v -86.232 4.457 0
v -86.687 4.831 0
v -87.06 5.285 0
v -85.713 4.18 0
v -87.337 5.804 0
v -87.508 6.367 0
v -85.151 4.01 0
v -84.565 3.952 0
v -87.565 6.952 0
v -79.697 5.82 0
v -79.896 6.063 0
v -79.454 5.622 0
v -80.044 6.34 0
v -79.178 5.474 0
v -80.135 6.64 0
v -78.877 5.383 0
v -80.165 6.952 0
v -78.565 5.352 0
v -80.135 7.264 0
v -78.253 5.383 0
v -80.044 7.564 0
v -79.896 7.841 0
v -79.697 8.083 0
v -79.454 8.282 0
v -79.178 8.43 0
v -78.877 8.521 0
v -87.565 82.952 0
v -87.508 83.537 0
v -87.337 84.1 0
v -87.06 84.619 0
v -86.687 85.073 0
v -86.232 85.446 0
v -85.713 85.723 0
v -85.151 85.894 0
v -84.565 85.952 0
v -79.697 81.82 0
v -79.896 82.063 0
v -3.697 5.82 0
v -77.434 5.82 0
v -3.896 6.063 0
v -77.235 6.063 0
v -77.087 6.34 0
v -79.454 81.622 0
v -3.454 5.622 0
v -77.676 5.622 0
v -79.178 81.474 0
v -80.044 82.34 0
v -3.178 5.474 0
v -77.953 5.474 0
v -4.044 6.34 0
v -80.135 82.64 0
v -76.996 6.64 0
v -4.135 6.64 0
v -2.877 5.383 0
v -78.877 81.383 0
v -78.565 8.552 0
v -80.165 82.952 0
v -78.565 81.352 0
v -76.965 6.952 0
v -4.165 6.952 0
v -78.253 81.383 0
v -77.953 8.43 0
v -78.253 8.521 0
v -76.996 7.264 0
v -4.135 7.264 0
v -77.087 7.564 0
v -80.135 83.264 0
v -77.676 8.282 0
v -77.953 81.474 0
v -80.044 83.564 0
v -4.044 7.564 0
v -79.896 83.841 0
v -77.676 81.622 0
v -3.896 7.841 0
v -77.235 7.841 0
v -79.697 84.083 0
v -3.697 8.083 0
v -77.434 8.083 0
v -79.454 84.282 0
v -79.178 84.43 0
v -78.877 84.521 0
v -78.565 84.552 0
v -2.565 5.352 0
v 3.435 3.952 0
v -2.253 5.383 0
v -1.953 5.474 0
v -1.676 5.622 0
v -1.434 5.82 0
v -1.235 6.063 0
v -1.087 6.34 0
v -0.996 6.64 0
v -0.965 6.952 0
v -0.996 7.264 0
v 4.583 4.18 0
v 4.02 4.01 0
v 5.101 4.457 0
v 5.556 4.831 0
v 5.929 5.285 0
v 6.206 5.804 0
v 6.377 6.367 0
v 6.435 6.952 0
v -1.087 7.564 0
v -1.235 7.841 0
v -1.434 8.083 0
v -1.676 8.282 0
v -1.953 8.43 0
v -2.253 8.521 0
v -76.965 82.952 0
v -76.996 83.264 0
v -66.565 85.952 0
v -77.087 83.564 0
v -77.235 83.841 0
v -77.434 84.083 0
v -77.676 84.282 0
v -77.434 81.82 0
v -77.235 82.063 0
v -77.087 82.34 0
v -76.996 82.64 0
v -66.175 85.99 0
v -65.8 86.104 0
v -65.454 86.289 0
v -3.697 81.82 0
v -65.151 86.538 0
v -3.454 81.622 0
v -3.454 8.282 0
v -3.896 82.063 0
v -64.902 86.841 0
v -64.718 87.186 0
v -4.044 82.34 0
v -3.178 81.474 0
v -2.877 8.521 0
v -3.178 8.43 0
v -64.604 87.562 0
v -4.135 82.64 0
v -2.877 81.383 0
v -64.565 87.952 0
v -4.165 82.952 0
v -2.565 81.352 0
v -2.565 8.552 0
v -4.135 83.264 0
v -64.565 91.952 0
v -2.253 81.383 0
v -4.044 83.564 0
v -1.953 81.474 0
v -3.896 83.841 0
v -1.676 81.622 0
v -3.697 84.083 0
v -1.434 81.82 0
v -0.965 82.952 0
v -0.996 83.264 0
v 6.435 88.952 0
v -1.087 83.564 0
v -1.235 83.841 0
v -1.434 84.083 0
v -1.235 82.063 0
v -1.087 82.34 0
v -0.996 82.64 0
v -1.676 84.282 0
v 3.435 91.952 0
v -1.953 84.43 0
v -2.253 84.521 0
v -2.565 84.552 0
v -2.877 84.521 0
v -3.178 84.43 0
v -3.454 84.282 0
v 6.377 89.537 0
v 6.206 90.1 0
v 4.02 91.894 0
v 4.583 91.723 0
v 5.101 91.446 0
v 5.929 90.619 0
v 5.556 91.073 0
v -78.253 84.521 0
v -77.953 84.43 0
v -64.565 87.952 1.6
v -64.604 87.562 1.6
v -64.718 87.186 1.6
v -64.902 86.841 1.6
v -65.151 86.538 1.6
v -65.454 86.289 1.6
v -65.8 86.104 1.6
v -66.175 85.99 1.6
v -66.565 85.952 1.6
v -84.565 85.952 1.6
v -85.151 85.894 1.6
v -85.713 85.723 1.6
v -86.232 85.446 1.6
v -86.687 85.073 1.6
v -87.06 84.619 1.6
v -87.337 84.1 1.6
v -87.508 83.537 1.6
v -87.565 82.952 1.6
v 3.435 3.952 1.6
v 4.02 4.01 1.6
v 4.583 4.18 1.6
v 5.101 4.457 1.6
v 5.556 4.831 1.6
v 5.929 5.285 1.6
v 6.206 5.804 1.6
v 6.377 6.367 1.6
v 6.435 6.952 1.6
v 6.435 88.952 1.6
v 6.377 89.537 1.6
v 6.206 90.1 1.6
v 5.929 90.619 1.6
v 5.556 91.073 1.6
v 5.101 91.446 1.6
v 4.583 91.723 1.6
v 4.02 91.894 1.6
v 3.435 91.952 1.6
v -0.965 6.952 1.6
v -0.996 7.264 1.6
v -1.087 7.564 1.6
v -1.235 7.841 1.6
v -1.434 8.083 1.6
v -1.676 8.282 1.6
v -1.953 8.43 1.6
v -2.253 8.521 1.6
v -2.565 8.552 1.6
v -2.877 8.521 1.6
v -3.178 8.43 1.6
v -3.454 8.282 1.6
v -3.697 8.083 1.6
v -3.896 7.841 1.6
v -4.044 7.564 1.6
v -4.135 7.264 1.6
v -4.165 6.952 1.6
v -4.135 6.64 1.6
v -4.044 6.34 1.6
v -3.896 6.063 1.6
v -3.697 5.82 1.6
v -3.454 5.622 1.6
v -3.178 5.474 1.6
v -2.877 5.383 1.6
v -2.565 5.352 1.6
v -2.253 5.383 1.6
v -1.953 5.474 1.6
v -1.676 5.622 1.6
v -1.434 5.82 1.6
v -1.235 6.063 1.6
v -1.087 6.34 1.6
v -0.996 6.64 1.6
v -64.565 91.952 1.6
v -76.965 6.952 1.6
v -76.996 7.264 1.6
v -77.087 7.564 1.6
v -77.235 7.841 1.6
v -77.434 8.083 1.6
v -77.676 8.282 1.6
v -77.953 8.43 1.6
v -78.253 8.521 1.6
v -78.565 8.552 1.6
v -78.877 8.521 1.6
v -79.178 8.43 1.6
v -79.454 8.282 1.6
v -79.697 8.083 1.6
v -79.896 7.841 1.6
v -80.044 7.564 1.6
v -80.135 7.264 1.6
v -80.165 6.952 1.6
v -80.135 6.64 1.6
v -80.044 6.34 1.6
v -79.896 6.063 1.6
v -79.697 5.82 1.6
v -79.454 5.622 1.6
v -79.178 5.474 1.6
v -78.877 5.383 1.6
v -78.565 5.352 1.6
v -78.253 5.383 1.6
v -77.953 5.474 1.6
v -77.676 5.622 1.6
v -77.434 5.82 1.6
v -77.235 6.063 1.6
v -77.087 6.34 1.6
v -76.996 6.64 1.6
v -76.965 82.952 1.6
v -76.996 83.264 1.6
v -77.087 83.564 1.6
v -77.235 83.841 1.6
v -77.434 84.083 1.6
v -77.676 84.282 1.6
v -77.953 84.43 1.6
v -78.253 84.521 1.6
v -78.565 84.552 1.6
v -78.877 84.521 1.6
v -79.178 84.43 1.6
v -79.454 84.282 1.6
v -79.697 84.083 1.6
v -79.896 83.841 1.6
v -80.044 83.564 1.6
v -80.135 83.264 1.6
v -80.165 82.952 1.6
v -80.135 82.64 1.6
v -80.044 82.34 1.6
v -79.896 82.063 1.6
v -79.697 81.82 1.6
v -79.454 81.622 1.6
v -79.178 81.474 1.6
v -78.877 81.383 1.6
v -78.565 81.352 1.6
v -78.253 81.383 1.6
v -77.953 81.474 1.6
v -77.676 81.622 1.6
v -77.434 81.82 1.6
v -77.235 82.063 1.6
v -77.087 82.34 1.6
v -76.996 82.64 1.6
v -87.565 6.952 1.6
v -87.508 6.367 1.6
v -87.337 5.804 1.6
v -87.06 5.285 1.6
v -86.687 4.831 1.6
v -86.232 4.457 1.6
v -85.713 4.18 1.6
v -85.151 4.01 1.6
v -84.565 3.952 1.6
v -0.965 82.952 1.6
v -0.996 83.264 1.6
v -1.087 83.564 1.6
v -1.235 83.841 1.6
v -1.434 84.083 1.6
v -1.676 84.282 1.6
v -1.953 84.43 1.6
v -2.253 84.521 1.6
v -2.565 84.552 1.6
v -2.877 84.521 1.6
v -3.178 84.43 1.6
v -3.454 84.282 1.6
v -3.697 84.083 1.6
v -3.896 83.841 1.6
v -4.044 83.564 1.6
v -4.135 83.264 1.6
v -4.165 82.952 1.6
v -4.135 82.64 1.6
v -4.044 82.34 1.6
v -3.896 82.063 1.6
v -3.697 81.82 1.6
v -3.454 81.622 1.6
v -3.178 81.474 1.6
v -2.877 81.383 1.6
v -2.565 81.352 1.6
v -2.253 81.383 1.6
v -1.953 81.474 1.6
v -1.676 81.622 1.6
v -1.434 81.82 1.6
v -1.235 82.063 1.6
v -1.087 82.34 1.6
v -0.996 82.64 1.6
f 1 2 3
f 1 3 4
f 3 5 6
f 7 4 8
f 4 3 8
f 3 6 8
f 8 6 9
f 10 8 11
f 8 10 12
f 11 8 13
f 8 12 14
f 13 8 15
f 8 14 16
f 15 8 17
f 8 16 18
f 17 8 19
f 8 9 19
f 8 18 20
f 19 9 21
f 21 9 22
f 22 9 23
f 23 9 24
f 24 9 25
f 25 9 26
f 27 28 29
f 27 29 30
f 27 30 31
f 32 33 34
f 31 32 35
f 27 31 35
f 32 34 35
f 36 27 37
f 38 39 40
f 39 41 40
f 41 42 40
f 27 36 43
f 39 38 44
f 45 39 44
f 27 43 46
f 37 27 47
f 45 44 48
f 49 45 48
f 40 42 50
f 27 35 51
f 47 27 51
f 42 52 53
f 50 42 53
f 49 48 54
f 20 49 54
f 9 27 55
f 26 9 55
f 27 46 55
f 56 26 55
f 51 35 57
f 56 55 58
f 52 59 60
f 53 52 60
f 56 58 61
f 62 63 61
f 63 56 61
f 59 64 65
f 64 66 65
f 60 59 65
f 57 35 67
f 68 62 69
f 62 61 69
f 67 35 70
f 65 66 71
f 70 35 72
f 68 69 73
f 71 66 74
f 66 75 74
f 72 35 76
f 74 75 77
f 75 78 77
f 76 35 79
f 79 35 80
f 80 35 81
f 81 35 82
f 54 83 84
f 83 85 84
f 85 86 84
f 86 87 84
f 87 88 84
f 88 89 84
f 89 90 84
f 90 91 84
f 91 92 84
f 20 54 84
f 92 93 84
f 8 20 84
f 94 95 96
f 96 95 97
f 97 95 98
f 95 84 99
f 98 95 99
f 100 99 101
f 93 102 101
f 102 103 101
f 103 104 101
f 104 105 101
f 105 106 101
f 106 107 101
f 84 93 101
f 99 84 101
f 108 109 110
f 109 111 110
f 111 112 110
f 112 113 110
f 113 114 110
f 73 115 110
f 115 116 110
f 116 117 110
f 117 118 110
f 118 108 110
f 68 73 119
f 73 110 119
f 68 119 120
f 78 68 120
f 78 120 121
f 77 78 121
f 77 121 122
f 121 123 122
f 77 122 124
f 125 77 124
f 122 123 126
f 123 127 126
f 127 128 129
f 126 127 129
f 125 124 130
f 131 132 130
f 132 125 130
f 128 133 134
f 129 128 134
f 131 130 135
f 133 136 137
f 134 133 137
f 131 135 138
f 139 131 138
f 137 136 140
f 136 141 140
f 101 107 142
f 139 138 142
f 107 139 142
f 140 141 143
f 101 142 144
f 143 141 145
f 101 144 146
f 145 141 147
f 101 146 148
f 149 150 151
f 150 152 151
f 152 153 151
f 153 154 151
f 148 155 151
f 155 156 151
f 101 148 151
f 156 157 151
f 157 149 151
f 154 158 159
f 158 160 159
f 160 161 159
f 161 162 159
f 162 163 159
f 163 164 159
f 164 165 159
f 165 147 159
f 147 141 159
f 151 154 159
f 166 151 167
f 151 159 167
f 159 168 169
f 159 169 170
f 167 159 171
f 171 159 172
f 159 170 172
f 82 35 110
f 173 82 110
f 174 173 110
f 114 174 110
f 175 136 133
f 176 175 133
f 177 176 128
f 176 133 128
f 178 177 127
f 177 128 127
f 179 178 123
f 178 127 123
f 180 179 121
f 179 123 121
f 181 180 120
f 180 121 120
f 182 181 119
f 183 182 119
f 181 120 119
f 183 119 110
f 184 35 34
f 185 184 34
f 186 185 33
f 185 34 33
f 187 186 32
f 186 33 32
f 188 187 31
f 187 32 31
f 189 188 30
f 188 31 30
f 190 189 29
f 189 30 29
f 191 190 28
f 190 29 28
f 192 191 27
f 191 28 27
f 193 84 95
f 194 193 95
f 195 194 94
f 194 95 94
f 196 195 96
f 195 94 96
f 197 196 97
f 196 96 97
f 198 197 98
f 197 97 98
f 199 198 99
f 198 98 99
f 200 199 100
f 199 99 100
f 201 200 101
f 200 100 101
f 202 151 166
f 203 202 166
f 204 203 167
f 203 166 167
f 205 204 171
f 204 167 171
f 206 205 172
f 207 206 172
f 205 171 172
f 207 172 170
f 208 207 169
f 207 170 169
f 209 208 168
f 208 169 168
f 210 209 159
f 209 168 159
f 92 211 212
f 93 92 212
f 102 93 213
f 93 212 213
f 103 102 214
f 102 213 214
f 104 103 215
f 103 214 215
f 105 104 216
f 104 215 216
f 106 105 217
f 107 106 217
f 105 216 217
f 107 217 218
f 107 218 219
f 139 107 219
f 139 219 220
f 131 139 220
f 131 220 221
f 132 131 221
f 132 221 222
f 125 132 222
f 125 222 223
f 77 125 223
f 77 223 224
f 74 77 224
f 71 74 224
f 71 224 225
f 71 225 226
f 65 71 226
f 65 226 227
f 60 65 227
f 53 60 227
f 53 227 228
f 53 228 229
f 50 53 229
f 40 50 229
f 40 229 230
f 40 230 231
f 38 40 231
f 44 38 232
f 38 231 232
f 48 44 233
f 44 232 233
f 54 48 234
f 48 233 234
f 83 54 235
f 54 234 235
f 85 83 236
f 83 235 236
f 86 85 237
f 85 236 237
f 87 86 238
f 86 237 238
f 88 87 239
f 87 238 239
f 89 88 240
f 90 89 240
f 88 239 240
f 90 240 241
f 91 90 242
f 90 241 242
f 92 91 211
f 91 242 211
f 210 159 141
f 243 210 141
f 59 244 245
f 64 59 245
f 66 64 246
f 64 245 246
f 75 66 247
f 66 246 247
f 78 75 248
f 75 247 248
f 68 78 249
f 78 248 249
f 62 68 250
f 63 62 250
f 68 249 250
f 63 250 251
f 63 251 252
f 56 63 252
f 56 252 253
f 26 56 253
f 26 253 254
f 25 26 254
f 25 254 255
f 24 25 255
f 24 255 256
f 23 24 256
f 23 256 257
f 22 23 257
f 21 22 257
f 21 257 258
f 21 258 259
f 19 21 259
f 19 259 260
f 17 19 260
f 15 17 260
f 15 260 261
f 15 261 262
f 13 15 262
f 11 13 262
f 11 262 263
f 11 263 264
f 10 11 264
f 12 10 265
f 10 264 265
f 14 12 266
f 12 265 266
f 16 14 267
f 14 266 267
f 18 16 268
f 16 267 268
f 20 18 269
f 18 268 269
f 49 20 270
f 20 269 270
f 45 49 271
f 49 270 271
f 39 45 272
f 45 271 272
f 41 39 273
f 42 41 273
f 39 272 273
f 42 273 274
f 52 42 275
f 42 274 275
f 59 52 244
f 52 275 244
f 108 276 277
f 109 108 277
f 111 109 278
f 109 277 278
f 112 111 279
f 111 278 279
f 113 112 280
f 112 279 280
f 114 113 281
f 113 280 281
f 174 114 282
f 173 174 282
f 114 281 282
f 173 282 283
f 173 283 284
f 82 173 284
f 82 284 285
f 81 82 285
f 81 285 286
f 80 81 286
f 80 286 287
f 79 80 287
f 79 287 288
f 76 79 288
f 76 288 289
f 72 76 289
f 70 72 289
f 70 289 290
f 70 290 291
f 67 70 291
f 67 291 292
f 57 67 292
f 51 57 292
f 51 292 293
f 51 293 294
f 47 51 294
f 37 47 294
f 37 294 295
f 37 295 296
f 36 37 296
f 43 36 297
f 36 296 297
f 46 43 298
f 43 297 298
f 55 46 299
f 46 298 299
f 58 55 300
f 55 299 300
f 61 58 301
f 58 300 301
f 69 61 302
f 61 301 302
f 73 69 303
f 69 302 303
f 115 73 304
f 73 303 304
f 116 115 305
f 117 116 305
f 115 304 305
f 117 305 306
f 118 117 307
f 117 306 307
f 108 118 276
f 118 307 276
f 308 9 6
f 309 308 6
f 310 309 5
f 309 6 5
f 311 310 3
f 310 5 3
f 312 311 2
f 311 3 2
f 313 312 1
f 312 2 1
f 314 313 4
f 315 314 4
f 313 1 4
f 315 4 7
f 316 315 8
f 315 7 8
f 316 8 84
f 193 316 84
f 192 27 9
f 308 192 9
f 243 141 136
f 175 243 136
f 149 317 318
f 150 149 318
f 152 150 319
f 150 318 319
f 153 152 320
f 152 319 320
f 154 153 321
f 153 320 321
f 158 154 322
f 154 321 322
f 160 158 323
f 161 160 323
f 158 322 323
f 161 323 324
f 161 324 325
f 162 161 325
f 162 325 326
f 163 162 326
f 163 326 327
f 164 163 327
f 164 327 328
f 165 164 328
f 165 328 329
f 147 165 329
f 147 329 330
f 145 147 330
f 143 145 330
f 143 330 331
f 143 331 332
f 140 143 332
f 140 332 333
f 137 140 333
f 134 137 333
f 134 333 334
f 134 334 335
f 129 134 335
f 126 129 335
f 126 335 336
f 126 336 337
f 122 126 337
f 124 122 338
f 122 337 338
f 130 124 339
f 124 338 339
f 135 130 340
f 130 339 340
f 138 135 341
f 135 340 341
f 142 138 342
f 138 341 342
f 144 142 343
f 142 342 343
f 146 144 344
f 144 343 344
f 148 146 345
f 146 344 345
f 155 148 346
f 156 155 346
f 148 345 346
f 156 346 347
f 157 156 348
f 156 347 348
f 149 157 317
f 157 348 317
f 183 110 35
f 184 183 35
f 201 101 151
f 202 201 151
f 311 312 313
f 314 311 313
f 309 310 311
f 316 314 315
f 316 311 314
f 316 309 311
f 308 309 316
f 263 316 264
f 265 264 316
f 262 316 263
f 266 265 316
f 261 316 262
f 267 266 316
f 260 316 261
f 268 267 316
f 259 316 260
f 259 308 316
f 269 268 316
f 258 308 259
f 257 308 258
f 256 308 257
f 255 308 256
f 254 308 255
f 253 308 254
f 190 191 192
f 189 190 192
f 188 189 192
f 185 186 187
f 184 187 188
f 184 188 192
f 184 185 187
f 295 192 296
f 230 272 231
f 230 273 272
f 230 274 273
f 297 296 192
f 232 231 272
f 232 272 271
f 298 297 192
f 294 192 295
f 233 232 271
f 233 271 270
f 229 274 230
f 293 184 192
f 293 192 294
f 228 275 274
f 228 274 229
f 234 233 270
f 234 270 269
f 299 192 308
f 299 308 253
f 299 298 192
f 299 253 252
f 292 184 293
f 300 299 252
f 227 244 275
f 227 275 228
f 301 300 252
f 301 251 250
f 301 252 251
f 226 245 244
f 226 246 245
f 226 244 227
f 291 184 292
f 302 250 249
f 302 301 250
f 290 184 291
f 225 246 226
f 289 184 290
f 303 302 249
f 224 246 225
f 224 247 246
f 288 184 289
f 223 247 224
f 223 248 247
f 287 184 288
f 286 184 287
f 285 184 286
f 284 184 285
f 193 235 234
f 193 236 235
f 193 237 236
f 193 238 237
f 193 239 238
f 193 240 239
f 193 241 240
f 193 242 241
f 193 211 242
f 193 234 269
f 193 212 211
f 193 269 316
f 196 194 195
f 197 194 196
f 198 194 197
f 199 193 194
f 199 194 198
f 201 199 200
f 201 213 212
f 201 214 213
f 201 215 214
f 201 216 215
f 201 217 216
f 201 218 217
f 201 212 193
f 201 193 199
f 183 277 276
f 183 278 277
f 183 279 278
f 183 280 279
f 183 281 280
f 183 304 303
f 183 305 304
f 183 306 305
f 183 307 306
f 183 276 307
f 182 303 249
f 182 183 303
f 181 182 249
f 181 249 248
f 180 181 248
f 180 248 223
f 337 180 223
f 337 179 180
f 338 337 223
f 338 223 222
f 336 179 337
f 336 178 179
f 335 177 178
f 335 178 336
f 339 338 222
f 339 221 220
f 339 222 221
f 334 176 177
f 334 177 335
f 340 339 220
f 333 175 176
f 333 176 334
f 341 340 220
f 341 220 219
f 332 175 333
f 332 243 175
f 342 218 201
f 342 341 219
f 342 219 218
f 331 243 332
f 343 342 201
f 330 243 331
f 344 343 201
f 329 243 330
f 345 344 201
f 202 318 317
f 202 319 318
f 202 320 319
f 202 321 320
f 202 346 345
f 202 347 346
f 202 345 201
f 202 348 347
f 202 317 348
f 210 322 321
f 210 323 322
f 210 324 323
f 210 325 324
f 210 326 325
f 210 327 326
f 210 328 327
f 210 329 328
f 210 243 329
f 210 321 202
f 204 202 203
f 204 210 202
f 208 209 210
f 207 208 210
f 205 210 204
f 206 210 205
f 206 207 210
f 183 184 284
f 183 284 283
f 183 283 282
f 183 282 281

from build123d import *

# Parameters (mm, degrees)
BOSS_EXTRUDE1_DEPTH        = 1.6
F_3_2_3_2_DIAMETER_HOLE3_D = 3.2


with BuildPart() as part:
    # Sketch1 → Boss-Extrude1 (new body)
    with BuildSketch(Plane.XY):
        with BuildLine():
            Line((-87.56534388, 82.95185693), (-87.56534388, 6.95185693))
            ThreePointArc((-87.56534388, 6.95185693), (-86.686664224, 4.830536587), (-84.56534388, 3.95185693))
            Line((-84.56534388, 3.95185693), (3.43465612, 3.95185693))
            ThreePointArc((3.43465612, 3.95185693), (5.555976464, 4.830536587), (6.43465612, 6.95185693))
            Line((6.43465612, 6.95185693), (6.43465612, 88.95185693))
            ThreePointArc((6.43465612, 88.95185693), (5.555976464, 91.073177274), (3.43465612, 91.95185693))
            Line((3.43465612, 91.95185693), (0.93465612, 91.95185693))
            Line((0.93465612, 91.95185693), (-64.56534388, 91.95185693))
            Line((-64.56534388, 91.95185693), (-64.56534388, 87.95185693))
            ThreePointArc((-64.56534388, 87.95185693), (-65.151130318, 86.537643368), (-66.56534388, 85.95185693))
            Line((-66.56534388, 85.95185693), (-84.56534388, 85.95185693))
            ThreePointArc((-84.56534388, 85.95185693), (-86.686664224, 85.073177274), (-87.56534388, 82.95185693))
        make_face()
    extrude(amount=BOSS_EXTRUDE1_DEPTH)

    # Ø3.2 (3.2) Diameter Hole3 (through all)
    with Locations(Plane(origin=(0, 0, 0), x_dir=(-1, 0, 0), z_dir=(0, 0, -1))):
        with Locations((78.56534388, 6.95185693), (78.56534388, 82.95185693), (2.56534388, 82.95185693), (2.56534388, 6.95185693)):
            Hole(F_3_2_3_2_DIAMETER_HOLE3_D / 2)


solid = part.part
